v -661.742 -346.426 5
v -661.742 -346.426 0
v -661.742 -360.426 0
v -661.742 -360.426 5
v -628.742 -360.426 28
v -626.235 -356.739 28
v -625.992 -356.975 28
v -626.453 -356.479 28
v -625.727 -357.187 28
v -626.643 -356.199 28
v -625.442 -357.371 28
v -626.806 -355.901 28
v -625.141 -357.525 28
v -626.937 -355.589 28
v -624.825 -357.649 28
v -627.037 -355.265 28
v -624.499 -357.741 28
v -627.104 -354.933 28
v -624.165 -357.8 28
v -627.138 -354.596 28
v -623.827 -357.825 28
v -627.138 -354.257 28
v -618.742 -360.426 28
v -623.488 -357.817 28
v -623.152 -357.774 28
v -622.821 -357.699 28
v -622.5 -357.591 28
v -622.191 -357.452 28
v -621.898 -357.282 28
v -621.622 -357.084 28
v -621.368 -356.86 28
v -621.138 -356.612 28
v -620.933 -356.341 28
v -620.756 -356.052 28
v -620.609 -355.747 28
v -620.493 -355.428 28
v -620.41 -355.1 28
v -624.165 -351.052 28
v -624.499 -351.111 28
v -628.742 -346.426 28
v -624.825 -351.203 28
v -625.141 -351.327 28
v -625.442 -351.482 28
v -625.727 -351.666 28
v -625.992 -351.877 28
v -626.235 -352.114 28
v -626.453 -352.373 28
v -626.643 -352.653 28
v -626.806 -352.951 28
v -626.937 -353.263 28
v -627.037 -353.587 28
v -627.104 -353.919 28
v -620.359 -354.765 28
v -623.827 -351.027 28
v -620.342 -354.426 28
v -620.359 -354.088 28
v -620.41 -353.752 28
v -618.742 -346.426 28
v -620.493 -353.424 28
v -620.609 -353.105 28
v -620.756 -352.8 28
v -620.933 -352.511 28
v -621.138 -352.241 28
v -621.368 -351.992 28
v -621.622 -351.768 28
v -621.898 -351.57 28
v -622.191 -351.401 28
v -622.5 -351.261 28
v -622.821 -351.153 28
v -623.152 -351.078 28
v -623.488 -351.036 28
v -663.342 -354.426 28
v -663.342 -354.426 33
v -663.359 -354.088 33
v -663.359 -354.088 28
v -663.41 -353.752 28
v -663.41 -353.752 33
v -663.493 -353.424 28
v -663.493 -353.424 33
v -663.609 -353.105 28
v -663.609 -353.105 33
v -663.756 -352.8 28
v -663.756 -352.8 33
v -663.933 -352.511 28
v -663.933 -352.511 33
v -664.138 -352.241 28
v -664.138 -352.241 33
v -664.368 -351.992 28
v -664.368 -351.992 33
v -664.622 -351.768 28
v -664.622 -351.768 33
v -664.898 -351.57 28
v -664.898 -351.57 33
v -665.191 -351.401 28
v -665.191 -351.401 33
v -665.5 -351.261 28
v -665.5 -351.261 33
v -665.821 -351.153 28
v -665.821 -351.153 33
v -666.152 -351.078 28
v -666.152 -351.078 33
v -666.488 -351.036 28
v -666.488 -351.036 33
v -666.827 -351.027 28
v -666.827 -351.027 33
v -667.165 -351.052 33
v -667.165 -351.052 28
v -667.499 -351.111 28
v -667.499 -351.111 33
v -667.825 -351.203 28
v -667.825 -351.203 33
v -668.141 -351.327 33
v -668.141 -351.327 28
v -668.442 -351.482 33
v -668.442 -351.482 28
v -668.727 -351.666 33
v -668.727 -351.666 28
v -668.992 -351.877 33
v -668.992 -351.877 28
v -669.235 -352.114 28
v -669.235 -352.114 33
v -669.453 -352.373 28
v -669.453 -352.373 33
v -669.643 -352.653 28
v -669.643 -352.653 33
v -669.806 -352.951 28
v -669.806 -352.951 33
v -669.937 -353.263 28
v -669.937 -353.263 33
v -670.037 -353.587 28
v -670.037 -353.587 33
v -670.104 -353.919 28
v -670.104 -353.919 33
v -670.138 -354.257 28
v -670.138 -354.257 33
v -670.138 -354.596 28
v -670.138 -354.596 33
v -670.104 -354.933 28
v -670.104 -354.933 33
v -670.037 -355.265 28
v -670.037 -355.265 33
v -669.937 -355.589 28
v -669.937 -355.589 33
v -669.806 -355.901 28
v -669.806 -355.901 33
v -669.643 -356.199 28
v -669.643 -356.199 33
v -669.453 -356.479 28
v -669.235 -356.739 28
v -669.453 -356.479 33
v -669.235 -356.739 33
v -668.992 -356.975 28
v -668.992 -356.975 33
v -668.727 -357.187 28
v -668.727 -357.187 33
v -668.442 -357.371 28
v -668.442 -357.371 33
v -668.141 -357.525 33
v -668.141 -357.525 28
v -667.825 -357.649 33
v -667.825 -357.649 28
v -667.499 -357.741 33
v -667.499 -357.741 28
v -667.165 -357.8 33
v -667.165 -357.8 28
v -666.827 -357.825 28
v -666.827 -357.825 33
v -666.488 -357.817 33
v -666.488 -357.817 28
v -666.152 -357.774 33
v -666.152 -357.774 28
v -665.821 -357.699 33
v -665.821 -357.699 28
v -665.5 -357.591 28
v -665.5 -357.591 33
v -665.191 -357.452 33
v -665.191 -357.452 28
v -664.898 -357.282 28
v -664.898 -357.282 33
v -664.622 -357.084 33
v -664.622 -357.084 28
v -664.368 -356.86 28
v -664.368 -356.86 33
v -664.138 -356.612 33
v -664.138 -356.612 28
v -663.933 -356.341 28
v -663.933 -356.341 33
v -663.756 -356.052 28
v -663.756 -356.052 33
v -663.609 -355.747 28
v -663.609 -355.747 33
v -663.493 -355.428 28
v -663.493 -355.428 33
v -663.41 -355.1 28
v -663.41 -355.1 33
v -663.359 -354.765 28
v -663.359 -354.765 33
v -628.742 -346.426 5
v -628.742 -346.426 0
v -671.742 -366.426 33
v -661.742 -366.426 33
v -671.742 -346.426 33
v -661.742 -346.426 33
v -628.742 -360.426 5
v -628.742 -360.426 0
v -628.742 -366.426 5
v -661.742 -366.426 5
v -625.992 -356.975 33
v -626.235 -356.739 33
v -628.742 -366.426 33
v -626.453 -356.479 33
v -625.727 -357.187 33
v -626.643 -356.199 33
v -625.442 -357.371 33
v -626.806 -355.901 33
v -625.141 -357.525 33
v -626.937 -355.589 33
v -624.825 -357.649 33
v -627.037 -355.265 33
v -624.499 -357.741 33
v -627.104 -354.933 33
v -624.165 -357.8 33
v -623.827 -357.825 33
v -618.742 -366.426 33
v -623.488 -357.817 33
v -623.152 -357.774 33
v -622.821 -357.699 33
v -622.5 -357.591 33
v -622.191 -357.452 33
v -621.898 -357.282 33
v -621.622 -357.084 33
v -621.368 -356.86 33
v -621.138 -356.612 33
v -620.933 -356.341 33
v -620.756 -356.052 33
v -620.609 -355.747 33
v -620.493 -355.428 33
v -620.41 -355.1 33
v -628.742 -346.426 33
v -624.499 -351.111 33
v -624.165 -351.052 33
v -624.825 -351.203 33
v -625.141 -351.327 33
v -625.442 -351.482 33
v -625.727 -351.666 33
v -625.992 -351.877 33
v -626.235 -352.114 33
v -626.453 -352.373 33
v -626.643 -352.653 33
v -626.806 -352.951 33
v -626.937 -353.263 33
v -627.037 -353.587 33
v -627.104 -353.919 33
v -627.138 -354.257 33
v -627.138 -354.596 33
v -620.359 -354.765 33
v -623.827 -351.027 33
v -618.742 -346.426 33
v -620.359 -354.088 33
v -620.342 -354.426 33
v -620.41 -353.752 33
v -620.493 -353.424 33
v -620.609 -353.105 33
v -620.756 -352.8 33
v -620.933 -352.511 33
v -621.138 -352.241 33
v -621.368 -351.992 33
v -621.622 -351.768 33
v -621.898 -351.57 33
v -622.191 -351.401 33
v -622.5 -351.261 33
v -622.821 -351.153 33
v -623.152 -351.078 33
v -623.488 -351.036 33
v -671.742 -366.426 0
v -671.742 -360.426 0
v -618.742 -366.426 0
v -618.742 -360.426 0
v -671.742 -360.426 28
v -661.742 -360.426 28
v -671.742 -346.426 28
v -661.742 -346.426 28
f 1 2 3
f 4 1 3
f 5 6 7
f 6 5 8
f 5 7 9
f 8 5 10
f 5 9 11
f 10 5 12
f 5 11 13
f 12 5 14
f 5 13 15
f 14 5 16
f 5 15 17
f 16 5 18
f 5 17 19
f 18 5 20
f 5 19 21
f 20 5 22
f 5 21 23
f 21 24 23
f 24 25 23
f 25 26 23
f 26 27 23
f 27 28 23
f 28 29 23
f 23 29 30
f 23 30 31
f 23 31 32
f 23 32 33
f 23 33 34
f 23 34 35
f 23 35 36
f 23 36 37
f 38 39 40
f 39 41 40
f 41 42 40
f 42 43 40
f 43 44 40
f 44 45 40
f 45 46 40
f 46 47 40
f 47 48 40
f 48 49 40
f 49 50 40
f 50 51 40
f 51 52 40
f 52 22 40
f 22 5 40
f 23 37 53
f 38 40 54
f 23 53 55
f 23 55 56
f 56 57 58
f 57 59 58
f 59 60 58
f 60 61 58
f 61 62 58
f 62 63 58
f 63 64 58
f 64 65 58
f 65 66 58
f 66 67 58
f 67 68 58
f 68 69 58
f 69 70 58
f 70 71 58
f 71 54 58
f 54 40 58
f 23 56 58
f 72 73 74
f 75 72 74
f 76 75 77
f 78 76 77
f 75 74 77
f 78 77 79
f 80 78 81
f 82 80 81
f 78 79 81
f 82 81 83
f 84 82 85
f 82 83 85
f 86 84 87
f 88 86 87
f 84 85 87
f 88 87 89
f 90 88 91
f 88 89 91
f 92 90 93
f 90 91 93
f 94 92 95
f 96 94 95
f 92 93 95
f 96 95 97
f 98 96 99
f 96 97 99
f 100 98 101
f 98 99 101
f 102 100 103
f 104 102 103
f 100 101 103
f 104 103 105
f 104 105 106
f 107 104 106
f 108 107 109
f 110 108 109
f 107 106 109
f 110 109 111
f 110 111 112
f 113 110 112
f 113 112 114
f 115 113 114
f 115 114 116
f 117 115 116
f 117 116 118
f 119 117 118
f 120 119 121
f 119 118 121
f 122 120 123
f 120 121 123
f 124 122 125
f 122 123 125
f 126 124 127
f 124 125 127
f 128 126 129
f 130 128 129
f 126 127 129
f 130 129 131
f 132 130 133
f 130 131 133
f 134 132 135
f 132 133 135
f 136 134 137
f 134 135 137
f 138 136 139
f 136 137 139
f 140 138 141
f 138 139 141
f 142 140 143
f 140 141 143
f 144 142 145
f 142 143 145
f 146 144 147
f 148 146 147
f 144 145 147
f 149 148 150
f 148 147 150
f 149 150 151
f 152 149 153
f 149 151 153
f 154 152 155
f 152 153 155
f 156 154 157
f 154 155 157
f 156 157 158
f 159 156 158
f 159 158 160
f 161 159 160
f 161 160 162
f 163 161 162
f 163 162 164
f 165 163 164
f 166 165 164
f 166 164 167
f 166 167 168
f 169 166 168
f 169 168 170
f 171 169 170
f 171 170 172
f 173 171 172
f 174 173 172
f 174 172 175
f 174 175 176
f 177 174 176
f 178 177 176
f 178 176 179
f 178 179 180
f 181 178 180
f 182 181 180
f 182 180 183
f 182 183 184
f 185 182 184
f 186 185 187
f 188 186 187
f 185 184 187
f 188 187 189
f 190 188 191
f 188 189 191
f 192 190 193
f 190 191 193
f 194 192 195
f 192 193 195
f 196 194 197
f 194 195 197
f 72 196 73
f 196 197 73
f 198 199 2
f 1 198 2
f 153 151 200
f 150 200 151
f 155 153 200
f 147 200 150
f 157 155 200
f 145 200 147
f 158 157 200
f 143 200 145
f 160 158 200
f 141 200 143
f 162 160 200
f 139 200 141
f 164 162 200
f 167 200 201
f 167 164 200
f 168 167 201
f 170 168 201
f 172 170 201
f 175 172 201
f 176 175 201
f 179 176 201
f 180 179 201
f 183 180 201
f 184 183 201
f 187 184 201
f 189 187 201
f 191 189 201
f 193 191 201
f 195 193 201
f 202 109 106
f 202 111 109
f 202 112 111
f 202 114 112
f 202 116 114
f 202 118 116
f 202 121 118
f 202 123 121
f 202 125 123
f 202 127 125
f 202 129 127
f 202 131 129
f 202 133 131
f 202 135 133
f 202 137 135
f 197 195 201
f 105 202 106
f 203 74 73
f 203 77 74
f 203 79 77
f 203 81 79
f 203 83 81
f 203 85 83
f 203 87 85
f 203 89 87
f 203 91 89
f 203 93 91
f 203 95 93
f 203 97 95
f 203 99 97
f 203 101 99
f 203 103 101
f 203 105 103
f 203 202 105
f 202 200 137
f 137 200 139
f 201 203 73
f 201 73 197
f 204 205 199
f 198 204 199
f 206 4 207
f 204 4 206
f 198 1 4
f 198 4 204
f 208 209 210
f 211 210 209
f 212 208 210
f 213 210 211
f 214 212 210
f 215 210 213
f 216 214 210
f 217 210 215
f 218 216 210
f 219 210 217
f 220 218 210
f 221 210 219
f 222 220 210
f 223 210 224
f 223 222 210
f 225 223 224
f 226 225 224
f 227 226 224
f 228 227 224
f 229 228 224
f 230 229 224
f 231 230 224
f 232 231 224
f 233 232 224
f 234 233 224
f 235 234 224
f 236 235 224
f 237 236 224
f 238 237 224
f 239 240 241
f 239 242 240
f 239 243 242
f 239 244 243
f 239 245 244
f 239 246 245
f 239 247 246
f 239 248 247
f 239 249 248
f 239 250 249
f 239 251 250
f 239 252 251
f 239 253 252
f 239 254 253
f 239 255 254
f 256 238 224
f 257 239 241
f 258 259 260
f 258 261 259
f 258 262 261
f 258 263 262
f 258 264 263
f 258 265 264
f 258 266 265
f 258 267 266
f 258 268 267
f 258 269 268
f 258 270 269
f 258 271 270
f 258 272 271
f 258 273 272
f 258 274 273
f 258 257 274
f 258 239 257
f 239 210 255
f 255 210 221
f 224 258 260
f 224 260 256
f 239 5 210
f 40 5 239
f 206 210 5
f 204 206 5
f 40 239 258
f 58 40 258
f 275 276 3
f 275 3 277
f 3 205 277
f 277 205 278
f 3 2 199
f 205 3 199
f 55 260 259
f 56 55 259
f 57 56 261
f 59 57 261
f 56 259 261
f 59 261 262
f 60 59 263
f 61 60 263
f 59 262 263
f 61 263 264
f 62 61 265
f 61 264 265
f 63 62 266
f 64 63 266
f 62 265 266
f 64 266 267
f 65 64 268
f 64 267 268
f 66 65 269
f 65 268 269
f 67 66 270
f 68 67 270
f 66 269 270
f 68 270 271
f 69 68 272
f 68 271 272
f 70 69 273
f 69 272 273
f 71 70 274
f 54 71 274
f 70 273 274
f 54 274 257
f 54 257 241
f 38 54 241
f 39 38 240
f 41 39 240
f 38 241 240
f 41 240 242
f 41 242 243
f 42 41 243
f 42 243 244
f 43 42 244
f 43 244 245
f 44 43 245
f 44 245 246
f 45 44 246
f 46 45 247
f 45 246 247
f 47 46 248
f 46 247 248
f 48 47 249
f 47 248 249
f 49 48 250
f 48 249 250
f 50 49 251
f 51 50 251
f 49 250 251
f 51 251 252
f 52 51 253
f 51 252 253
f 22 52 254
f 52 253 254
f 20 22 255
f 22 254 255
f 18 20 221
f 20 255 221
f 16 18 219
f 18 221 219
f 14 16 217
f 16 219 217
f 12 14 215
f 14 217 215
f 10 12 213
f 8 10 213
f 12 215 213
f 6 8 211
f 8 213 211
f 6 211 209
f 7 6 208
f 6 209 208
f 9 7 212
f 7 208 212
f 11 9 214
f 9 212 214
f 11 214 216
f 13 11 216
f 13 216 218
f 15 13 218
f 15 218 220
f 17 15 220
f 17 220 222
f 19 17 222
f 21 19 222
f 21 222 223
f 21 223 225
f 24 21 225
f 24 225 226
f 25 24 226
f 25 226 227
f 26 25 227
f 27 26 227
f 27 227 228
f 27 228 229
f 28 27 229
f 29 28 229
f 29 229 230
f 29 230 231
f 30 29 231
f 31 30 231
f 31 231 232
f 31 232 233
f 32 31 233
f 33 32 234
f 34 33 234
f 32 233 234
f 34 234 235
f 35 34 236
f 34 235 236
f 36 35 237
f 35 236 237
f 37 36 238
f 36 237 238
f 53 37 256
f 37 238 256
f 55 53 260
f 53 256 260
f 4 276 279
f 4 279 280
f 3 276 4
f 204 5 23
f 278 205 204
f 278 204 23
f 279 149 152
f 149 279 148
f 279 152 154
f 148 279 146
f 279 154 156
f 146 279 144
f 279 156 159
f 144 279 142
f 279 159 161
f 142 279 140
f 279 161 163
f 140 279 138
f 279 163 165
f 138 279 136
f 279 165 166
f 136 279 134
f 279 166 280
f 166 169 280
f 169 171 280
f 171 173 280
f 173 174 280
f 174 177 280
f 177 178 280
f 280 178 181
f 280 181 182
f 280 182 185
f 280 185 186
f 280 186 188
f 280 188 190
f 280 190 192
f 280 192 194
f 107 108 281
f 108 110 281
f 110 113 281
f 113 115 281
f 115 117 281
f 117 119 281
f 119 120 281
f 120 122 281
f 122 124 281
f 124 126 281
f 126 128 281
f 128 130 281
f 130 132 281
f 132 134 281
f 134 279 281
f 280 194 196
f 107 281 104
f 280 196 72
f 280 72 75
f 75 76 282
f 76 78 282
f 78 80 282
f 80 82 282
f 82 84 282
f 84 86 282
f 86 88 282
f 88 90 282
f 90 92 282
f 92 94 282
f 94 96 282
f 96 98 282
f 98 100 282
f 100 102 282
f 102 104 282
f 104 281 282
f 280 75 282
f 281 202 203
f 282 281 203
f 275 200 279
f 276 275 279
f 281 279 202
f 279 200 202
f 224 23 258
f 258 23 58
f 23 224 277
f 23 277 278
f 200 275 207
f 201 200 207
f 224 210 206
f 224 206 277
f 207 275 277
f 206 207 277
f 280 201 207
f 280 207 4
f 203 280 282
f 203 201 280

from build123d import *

# Parameters (mm, degrees)
BOSS_EXTRUDE1_DEPTH = 5
SKETCH1_7_W         = 10
SKETCH1_7_H         = 6
BOSS_EXTRUDE2_DEPTH = 33
BOSS_EXTRUDE3_START = 33
SKETCH1_9_W         = 10
SKETCH1_9_H         = 14
SKETCH1_9_R         = 3.4
BOSS_EXTRUDE3_DEPTH = 5


with BuildPart() as part:
    # Sketch1 → Boss-Extrude1 (new body)
    with BuildSketch(Plane.XY):
        Polygon((-628.74225666, -346.426096697), (-661.74225666, -346.426096697), (-661.74225666, -360.426096697), (-661.74225666, -366.426096697), (-628.74225666, -366.426096697), (-628.74225666, -360.426096697), align=None)
    extrude(amount=BOSS_EXTRUDE1_DEPTH)

    # Sketch1<7> → Boss-Extrude2 (add)
    with BuildSketch(Plane.XY):
        with Locations((-623.74225666, -363.426096697)):
            Rectangle(SKETCH1_7_W, SKETCH1_7_H)
        with Locations((-666.74225666, -363.426096697)):
            Rectangle(SKETCH1_7_W, SKETCH1_7_H)
    extrude(amount=BOSS_EXTRUDE2_DEPTH)

    # Sketch1<9> → Boss-Extrude3 (add)
    # profile 1 of 2: a face of its own
    with BuildSketch(Plane.XY.offset(BOSS_EXTRUDE3_START)):
        with Locations((-666.74225666, -353.426096697)):
            Rectangle(SKETCH1_9_W, SKETCH1_9_H)
        with Locations((-666.74225666, -354.426096697)):
            Circle(SKETCH1_9_R, mode=Mode.SUBTRACT)
    # profile 2 of 2: a face of its own
    with BuildSketch(Plane.XY.offset(BOSS_EXTRUDE3_START)):
        with Locations((-623.74225666, -353.426096697)):
            Rectangle(SKETCH1_9_W, SKETCH1_9_H)
        with Locations((-623.74225666, -354.426096697)):
            Circle(SKETCH1_9_R, mode=Mode.SUBTRACT)
    extrude(amount=-BOSS_EXTRUDE3_DEPTH)


solid = part.part
